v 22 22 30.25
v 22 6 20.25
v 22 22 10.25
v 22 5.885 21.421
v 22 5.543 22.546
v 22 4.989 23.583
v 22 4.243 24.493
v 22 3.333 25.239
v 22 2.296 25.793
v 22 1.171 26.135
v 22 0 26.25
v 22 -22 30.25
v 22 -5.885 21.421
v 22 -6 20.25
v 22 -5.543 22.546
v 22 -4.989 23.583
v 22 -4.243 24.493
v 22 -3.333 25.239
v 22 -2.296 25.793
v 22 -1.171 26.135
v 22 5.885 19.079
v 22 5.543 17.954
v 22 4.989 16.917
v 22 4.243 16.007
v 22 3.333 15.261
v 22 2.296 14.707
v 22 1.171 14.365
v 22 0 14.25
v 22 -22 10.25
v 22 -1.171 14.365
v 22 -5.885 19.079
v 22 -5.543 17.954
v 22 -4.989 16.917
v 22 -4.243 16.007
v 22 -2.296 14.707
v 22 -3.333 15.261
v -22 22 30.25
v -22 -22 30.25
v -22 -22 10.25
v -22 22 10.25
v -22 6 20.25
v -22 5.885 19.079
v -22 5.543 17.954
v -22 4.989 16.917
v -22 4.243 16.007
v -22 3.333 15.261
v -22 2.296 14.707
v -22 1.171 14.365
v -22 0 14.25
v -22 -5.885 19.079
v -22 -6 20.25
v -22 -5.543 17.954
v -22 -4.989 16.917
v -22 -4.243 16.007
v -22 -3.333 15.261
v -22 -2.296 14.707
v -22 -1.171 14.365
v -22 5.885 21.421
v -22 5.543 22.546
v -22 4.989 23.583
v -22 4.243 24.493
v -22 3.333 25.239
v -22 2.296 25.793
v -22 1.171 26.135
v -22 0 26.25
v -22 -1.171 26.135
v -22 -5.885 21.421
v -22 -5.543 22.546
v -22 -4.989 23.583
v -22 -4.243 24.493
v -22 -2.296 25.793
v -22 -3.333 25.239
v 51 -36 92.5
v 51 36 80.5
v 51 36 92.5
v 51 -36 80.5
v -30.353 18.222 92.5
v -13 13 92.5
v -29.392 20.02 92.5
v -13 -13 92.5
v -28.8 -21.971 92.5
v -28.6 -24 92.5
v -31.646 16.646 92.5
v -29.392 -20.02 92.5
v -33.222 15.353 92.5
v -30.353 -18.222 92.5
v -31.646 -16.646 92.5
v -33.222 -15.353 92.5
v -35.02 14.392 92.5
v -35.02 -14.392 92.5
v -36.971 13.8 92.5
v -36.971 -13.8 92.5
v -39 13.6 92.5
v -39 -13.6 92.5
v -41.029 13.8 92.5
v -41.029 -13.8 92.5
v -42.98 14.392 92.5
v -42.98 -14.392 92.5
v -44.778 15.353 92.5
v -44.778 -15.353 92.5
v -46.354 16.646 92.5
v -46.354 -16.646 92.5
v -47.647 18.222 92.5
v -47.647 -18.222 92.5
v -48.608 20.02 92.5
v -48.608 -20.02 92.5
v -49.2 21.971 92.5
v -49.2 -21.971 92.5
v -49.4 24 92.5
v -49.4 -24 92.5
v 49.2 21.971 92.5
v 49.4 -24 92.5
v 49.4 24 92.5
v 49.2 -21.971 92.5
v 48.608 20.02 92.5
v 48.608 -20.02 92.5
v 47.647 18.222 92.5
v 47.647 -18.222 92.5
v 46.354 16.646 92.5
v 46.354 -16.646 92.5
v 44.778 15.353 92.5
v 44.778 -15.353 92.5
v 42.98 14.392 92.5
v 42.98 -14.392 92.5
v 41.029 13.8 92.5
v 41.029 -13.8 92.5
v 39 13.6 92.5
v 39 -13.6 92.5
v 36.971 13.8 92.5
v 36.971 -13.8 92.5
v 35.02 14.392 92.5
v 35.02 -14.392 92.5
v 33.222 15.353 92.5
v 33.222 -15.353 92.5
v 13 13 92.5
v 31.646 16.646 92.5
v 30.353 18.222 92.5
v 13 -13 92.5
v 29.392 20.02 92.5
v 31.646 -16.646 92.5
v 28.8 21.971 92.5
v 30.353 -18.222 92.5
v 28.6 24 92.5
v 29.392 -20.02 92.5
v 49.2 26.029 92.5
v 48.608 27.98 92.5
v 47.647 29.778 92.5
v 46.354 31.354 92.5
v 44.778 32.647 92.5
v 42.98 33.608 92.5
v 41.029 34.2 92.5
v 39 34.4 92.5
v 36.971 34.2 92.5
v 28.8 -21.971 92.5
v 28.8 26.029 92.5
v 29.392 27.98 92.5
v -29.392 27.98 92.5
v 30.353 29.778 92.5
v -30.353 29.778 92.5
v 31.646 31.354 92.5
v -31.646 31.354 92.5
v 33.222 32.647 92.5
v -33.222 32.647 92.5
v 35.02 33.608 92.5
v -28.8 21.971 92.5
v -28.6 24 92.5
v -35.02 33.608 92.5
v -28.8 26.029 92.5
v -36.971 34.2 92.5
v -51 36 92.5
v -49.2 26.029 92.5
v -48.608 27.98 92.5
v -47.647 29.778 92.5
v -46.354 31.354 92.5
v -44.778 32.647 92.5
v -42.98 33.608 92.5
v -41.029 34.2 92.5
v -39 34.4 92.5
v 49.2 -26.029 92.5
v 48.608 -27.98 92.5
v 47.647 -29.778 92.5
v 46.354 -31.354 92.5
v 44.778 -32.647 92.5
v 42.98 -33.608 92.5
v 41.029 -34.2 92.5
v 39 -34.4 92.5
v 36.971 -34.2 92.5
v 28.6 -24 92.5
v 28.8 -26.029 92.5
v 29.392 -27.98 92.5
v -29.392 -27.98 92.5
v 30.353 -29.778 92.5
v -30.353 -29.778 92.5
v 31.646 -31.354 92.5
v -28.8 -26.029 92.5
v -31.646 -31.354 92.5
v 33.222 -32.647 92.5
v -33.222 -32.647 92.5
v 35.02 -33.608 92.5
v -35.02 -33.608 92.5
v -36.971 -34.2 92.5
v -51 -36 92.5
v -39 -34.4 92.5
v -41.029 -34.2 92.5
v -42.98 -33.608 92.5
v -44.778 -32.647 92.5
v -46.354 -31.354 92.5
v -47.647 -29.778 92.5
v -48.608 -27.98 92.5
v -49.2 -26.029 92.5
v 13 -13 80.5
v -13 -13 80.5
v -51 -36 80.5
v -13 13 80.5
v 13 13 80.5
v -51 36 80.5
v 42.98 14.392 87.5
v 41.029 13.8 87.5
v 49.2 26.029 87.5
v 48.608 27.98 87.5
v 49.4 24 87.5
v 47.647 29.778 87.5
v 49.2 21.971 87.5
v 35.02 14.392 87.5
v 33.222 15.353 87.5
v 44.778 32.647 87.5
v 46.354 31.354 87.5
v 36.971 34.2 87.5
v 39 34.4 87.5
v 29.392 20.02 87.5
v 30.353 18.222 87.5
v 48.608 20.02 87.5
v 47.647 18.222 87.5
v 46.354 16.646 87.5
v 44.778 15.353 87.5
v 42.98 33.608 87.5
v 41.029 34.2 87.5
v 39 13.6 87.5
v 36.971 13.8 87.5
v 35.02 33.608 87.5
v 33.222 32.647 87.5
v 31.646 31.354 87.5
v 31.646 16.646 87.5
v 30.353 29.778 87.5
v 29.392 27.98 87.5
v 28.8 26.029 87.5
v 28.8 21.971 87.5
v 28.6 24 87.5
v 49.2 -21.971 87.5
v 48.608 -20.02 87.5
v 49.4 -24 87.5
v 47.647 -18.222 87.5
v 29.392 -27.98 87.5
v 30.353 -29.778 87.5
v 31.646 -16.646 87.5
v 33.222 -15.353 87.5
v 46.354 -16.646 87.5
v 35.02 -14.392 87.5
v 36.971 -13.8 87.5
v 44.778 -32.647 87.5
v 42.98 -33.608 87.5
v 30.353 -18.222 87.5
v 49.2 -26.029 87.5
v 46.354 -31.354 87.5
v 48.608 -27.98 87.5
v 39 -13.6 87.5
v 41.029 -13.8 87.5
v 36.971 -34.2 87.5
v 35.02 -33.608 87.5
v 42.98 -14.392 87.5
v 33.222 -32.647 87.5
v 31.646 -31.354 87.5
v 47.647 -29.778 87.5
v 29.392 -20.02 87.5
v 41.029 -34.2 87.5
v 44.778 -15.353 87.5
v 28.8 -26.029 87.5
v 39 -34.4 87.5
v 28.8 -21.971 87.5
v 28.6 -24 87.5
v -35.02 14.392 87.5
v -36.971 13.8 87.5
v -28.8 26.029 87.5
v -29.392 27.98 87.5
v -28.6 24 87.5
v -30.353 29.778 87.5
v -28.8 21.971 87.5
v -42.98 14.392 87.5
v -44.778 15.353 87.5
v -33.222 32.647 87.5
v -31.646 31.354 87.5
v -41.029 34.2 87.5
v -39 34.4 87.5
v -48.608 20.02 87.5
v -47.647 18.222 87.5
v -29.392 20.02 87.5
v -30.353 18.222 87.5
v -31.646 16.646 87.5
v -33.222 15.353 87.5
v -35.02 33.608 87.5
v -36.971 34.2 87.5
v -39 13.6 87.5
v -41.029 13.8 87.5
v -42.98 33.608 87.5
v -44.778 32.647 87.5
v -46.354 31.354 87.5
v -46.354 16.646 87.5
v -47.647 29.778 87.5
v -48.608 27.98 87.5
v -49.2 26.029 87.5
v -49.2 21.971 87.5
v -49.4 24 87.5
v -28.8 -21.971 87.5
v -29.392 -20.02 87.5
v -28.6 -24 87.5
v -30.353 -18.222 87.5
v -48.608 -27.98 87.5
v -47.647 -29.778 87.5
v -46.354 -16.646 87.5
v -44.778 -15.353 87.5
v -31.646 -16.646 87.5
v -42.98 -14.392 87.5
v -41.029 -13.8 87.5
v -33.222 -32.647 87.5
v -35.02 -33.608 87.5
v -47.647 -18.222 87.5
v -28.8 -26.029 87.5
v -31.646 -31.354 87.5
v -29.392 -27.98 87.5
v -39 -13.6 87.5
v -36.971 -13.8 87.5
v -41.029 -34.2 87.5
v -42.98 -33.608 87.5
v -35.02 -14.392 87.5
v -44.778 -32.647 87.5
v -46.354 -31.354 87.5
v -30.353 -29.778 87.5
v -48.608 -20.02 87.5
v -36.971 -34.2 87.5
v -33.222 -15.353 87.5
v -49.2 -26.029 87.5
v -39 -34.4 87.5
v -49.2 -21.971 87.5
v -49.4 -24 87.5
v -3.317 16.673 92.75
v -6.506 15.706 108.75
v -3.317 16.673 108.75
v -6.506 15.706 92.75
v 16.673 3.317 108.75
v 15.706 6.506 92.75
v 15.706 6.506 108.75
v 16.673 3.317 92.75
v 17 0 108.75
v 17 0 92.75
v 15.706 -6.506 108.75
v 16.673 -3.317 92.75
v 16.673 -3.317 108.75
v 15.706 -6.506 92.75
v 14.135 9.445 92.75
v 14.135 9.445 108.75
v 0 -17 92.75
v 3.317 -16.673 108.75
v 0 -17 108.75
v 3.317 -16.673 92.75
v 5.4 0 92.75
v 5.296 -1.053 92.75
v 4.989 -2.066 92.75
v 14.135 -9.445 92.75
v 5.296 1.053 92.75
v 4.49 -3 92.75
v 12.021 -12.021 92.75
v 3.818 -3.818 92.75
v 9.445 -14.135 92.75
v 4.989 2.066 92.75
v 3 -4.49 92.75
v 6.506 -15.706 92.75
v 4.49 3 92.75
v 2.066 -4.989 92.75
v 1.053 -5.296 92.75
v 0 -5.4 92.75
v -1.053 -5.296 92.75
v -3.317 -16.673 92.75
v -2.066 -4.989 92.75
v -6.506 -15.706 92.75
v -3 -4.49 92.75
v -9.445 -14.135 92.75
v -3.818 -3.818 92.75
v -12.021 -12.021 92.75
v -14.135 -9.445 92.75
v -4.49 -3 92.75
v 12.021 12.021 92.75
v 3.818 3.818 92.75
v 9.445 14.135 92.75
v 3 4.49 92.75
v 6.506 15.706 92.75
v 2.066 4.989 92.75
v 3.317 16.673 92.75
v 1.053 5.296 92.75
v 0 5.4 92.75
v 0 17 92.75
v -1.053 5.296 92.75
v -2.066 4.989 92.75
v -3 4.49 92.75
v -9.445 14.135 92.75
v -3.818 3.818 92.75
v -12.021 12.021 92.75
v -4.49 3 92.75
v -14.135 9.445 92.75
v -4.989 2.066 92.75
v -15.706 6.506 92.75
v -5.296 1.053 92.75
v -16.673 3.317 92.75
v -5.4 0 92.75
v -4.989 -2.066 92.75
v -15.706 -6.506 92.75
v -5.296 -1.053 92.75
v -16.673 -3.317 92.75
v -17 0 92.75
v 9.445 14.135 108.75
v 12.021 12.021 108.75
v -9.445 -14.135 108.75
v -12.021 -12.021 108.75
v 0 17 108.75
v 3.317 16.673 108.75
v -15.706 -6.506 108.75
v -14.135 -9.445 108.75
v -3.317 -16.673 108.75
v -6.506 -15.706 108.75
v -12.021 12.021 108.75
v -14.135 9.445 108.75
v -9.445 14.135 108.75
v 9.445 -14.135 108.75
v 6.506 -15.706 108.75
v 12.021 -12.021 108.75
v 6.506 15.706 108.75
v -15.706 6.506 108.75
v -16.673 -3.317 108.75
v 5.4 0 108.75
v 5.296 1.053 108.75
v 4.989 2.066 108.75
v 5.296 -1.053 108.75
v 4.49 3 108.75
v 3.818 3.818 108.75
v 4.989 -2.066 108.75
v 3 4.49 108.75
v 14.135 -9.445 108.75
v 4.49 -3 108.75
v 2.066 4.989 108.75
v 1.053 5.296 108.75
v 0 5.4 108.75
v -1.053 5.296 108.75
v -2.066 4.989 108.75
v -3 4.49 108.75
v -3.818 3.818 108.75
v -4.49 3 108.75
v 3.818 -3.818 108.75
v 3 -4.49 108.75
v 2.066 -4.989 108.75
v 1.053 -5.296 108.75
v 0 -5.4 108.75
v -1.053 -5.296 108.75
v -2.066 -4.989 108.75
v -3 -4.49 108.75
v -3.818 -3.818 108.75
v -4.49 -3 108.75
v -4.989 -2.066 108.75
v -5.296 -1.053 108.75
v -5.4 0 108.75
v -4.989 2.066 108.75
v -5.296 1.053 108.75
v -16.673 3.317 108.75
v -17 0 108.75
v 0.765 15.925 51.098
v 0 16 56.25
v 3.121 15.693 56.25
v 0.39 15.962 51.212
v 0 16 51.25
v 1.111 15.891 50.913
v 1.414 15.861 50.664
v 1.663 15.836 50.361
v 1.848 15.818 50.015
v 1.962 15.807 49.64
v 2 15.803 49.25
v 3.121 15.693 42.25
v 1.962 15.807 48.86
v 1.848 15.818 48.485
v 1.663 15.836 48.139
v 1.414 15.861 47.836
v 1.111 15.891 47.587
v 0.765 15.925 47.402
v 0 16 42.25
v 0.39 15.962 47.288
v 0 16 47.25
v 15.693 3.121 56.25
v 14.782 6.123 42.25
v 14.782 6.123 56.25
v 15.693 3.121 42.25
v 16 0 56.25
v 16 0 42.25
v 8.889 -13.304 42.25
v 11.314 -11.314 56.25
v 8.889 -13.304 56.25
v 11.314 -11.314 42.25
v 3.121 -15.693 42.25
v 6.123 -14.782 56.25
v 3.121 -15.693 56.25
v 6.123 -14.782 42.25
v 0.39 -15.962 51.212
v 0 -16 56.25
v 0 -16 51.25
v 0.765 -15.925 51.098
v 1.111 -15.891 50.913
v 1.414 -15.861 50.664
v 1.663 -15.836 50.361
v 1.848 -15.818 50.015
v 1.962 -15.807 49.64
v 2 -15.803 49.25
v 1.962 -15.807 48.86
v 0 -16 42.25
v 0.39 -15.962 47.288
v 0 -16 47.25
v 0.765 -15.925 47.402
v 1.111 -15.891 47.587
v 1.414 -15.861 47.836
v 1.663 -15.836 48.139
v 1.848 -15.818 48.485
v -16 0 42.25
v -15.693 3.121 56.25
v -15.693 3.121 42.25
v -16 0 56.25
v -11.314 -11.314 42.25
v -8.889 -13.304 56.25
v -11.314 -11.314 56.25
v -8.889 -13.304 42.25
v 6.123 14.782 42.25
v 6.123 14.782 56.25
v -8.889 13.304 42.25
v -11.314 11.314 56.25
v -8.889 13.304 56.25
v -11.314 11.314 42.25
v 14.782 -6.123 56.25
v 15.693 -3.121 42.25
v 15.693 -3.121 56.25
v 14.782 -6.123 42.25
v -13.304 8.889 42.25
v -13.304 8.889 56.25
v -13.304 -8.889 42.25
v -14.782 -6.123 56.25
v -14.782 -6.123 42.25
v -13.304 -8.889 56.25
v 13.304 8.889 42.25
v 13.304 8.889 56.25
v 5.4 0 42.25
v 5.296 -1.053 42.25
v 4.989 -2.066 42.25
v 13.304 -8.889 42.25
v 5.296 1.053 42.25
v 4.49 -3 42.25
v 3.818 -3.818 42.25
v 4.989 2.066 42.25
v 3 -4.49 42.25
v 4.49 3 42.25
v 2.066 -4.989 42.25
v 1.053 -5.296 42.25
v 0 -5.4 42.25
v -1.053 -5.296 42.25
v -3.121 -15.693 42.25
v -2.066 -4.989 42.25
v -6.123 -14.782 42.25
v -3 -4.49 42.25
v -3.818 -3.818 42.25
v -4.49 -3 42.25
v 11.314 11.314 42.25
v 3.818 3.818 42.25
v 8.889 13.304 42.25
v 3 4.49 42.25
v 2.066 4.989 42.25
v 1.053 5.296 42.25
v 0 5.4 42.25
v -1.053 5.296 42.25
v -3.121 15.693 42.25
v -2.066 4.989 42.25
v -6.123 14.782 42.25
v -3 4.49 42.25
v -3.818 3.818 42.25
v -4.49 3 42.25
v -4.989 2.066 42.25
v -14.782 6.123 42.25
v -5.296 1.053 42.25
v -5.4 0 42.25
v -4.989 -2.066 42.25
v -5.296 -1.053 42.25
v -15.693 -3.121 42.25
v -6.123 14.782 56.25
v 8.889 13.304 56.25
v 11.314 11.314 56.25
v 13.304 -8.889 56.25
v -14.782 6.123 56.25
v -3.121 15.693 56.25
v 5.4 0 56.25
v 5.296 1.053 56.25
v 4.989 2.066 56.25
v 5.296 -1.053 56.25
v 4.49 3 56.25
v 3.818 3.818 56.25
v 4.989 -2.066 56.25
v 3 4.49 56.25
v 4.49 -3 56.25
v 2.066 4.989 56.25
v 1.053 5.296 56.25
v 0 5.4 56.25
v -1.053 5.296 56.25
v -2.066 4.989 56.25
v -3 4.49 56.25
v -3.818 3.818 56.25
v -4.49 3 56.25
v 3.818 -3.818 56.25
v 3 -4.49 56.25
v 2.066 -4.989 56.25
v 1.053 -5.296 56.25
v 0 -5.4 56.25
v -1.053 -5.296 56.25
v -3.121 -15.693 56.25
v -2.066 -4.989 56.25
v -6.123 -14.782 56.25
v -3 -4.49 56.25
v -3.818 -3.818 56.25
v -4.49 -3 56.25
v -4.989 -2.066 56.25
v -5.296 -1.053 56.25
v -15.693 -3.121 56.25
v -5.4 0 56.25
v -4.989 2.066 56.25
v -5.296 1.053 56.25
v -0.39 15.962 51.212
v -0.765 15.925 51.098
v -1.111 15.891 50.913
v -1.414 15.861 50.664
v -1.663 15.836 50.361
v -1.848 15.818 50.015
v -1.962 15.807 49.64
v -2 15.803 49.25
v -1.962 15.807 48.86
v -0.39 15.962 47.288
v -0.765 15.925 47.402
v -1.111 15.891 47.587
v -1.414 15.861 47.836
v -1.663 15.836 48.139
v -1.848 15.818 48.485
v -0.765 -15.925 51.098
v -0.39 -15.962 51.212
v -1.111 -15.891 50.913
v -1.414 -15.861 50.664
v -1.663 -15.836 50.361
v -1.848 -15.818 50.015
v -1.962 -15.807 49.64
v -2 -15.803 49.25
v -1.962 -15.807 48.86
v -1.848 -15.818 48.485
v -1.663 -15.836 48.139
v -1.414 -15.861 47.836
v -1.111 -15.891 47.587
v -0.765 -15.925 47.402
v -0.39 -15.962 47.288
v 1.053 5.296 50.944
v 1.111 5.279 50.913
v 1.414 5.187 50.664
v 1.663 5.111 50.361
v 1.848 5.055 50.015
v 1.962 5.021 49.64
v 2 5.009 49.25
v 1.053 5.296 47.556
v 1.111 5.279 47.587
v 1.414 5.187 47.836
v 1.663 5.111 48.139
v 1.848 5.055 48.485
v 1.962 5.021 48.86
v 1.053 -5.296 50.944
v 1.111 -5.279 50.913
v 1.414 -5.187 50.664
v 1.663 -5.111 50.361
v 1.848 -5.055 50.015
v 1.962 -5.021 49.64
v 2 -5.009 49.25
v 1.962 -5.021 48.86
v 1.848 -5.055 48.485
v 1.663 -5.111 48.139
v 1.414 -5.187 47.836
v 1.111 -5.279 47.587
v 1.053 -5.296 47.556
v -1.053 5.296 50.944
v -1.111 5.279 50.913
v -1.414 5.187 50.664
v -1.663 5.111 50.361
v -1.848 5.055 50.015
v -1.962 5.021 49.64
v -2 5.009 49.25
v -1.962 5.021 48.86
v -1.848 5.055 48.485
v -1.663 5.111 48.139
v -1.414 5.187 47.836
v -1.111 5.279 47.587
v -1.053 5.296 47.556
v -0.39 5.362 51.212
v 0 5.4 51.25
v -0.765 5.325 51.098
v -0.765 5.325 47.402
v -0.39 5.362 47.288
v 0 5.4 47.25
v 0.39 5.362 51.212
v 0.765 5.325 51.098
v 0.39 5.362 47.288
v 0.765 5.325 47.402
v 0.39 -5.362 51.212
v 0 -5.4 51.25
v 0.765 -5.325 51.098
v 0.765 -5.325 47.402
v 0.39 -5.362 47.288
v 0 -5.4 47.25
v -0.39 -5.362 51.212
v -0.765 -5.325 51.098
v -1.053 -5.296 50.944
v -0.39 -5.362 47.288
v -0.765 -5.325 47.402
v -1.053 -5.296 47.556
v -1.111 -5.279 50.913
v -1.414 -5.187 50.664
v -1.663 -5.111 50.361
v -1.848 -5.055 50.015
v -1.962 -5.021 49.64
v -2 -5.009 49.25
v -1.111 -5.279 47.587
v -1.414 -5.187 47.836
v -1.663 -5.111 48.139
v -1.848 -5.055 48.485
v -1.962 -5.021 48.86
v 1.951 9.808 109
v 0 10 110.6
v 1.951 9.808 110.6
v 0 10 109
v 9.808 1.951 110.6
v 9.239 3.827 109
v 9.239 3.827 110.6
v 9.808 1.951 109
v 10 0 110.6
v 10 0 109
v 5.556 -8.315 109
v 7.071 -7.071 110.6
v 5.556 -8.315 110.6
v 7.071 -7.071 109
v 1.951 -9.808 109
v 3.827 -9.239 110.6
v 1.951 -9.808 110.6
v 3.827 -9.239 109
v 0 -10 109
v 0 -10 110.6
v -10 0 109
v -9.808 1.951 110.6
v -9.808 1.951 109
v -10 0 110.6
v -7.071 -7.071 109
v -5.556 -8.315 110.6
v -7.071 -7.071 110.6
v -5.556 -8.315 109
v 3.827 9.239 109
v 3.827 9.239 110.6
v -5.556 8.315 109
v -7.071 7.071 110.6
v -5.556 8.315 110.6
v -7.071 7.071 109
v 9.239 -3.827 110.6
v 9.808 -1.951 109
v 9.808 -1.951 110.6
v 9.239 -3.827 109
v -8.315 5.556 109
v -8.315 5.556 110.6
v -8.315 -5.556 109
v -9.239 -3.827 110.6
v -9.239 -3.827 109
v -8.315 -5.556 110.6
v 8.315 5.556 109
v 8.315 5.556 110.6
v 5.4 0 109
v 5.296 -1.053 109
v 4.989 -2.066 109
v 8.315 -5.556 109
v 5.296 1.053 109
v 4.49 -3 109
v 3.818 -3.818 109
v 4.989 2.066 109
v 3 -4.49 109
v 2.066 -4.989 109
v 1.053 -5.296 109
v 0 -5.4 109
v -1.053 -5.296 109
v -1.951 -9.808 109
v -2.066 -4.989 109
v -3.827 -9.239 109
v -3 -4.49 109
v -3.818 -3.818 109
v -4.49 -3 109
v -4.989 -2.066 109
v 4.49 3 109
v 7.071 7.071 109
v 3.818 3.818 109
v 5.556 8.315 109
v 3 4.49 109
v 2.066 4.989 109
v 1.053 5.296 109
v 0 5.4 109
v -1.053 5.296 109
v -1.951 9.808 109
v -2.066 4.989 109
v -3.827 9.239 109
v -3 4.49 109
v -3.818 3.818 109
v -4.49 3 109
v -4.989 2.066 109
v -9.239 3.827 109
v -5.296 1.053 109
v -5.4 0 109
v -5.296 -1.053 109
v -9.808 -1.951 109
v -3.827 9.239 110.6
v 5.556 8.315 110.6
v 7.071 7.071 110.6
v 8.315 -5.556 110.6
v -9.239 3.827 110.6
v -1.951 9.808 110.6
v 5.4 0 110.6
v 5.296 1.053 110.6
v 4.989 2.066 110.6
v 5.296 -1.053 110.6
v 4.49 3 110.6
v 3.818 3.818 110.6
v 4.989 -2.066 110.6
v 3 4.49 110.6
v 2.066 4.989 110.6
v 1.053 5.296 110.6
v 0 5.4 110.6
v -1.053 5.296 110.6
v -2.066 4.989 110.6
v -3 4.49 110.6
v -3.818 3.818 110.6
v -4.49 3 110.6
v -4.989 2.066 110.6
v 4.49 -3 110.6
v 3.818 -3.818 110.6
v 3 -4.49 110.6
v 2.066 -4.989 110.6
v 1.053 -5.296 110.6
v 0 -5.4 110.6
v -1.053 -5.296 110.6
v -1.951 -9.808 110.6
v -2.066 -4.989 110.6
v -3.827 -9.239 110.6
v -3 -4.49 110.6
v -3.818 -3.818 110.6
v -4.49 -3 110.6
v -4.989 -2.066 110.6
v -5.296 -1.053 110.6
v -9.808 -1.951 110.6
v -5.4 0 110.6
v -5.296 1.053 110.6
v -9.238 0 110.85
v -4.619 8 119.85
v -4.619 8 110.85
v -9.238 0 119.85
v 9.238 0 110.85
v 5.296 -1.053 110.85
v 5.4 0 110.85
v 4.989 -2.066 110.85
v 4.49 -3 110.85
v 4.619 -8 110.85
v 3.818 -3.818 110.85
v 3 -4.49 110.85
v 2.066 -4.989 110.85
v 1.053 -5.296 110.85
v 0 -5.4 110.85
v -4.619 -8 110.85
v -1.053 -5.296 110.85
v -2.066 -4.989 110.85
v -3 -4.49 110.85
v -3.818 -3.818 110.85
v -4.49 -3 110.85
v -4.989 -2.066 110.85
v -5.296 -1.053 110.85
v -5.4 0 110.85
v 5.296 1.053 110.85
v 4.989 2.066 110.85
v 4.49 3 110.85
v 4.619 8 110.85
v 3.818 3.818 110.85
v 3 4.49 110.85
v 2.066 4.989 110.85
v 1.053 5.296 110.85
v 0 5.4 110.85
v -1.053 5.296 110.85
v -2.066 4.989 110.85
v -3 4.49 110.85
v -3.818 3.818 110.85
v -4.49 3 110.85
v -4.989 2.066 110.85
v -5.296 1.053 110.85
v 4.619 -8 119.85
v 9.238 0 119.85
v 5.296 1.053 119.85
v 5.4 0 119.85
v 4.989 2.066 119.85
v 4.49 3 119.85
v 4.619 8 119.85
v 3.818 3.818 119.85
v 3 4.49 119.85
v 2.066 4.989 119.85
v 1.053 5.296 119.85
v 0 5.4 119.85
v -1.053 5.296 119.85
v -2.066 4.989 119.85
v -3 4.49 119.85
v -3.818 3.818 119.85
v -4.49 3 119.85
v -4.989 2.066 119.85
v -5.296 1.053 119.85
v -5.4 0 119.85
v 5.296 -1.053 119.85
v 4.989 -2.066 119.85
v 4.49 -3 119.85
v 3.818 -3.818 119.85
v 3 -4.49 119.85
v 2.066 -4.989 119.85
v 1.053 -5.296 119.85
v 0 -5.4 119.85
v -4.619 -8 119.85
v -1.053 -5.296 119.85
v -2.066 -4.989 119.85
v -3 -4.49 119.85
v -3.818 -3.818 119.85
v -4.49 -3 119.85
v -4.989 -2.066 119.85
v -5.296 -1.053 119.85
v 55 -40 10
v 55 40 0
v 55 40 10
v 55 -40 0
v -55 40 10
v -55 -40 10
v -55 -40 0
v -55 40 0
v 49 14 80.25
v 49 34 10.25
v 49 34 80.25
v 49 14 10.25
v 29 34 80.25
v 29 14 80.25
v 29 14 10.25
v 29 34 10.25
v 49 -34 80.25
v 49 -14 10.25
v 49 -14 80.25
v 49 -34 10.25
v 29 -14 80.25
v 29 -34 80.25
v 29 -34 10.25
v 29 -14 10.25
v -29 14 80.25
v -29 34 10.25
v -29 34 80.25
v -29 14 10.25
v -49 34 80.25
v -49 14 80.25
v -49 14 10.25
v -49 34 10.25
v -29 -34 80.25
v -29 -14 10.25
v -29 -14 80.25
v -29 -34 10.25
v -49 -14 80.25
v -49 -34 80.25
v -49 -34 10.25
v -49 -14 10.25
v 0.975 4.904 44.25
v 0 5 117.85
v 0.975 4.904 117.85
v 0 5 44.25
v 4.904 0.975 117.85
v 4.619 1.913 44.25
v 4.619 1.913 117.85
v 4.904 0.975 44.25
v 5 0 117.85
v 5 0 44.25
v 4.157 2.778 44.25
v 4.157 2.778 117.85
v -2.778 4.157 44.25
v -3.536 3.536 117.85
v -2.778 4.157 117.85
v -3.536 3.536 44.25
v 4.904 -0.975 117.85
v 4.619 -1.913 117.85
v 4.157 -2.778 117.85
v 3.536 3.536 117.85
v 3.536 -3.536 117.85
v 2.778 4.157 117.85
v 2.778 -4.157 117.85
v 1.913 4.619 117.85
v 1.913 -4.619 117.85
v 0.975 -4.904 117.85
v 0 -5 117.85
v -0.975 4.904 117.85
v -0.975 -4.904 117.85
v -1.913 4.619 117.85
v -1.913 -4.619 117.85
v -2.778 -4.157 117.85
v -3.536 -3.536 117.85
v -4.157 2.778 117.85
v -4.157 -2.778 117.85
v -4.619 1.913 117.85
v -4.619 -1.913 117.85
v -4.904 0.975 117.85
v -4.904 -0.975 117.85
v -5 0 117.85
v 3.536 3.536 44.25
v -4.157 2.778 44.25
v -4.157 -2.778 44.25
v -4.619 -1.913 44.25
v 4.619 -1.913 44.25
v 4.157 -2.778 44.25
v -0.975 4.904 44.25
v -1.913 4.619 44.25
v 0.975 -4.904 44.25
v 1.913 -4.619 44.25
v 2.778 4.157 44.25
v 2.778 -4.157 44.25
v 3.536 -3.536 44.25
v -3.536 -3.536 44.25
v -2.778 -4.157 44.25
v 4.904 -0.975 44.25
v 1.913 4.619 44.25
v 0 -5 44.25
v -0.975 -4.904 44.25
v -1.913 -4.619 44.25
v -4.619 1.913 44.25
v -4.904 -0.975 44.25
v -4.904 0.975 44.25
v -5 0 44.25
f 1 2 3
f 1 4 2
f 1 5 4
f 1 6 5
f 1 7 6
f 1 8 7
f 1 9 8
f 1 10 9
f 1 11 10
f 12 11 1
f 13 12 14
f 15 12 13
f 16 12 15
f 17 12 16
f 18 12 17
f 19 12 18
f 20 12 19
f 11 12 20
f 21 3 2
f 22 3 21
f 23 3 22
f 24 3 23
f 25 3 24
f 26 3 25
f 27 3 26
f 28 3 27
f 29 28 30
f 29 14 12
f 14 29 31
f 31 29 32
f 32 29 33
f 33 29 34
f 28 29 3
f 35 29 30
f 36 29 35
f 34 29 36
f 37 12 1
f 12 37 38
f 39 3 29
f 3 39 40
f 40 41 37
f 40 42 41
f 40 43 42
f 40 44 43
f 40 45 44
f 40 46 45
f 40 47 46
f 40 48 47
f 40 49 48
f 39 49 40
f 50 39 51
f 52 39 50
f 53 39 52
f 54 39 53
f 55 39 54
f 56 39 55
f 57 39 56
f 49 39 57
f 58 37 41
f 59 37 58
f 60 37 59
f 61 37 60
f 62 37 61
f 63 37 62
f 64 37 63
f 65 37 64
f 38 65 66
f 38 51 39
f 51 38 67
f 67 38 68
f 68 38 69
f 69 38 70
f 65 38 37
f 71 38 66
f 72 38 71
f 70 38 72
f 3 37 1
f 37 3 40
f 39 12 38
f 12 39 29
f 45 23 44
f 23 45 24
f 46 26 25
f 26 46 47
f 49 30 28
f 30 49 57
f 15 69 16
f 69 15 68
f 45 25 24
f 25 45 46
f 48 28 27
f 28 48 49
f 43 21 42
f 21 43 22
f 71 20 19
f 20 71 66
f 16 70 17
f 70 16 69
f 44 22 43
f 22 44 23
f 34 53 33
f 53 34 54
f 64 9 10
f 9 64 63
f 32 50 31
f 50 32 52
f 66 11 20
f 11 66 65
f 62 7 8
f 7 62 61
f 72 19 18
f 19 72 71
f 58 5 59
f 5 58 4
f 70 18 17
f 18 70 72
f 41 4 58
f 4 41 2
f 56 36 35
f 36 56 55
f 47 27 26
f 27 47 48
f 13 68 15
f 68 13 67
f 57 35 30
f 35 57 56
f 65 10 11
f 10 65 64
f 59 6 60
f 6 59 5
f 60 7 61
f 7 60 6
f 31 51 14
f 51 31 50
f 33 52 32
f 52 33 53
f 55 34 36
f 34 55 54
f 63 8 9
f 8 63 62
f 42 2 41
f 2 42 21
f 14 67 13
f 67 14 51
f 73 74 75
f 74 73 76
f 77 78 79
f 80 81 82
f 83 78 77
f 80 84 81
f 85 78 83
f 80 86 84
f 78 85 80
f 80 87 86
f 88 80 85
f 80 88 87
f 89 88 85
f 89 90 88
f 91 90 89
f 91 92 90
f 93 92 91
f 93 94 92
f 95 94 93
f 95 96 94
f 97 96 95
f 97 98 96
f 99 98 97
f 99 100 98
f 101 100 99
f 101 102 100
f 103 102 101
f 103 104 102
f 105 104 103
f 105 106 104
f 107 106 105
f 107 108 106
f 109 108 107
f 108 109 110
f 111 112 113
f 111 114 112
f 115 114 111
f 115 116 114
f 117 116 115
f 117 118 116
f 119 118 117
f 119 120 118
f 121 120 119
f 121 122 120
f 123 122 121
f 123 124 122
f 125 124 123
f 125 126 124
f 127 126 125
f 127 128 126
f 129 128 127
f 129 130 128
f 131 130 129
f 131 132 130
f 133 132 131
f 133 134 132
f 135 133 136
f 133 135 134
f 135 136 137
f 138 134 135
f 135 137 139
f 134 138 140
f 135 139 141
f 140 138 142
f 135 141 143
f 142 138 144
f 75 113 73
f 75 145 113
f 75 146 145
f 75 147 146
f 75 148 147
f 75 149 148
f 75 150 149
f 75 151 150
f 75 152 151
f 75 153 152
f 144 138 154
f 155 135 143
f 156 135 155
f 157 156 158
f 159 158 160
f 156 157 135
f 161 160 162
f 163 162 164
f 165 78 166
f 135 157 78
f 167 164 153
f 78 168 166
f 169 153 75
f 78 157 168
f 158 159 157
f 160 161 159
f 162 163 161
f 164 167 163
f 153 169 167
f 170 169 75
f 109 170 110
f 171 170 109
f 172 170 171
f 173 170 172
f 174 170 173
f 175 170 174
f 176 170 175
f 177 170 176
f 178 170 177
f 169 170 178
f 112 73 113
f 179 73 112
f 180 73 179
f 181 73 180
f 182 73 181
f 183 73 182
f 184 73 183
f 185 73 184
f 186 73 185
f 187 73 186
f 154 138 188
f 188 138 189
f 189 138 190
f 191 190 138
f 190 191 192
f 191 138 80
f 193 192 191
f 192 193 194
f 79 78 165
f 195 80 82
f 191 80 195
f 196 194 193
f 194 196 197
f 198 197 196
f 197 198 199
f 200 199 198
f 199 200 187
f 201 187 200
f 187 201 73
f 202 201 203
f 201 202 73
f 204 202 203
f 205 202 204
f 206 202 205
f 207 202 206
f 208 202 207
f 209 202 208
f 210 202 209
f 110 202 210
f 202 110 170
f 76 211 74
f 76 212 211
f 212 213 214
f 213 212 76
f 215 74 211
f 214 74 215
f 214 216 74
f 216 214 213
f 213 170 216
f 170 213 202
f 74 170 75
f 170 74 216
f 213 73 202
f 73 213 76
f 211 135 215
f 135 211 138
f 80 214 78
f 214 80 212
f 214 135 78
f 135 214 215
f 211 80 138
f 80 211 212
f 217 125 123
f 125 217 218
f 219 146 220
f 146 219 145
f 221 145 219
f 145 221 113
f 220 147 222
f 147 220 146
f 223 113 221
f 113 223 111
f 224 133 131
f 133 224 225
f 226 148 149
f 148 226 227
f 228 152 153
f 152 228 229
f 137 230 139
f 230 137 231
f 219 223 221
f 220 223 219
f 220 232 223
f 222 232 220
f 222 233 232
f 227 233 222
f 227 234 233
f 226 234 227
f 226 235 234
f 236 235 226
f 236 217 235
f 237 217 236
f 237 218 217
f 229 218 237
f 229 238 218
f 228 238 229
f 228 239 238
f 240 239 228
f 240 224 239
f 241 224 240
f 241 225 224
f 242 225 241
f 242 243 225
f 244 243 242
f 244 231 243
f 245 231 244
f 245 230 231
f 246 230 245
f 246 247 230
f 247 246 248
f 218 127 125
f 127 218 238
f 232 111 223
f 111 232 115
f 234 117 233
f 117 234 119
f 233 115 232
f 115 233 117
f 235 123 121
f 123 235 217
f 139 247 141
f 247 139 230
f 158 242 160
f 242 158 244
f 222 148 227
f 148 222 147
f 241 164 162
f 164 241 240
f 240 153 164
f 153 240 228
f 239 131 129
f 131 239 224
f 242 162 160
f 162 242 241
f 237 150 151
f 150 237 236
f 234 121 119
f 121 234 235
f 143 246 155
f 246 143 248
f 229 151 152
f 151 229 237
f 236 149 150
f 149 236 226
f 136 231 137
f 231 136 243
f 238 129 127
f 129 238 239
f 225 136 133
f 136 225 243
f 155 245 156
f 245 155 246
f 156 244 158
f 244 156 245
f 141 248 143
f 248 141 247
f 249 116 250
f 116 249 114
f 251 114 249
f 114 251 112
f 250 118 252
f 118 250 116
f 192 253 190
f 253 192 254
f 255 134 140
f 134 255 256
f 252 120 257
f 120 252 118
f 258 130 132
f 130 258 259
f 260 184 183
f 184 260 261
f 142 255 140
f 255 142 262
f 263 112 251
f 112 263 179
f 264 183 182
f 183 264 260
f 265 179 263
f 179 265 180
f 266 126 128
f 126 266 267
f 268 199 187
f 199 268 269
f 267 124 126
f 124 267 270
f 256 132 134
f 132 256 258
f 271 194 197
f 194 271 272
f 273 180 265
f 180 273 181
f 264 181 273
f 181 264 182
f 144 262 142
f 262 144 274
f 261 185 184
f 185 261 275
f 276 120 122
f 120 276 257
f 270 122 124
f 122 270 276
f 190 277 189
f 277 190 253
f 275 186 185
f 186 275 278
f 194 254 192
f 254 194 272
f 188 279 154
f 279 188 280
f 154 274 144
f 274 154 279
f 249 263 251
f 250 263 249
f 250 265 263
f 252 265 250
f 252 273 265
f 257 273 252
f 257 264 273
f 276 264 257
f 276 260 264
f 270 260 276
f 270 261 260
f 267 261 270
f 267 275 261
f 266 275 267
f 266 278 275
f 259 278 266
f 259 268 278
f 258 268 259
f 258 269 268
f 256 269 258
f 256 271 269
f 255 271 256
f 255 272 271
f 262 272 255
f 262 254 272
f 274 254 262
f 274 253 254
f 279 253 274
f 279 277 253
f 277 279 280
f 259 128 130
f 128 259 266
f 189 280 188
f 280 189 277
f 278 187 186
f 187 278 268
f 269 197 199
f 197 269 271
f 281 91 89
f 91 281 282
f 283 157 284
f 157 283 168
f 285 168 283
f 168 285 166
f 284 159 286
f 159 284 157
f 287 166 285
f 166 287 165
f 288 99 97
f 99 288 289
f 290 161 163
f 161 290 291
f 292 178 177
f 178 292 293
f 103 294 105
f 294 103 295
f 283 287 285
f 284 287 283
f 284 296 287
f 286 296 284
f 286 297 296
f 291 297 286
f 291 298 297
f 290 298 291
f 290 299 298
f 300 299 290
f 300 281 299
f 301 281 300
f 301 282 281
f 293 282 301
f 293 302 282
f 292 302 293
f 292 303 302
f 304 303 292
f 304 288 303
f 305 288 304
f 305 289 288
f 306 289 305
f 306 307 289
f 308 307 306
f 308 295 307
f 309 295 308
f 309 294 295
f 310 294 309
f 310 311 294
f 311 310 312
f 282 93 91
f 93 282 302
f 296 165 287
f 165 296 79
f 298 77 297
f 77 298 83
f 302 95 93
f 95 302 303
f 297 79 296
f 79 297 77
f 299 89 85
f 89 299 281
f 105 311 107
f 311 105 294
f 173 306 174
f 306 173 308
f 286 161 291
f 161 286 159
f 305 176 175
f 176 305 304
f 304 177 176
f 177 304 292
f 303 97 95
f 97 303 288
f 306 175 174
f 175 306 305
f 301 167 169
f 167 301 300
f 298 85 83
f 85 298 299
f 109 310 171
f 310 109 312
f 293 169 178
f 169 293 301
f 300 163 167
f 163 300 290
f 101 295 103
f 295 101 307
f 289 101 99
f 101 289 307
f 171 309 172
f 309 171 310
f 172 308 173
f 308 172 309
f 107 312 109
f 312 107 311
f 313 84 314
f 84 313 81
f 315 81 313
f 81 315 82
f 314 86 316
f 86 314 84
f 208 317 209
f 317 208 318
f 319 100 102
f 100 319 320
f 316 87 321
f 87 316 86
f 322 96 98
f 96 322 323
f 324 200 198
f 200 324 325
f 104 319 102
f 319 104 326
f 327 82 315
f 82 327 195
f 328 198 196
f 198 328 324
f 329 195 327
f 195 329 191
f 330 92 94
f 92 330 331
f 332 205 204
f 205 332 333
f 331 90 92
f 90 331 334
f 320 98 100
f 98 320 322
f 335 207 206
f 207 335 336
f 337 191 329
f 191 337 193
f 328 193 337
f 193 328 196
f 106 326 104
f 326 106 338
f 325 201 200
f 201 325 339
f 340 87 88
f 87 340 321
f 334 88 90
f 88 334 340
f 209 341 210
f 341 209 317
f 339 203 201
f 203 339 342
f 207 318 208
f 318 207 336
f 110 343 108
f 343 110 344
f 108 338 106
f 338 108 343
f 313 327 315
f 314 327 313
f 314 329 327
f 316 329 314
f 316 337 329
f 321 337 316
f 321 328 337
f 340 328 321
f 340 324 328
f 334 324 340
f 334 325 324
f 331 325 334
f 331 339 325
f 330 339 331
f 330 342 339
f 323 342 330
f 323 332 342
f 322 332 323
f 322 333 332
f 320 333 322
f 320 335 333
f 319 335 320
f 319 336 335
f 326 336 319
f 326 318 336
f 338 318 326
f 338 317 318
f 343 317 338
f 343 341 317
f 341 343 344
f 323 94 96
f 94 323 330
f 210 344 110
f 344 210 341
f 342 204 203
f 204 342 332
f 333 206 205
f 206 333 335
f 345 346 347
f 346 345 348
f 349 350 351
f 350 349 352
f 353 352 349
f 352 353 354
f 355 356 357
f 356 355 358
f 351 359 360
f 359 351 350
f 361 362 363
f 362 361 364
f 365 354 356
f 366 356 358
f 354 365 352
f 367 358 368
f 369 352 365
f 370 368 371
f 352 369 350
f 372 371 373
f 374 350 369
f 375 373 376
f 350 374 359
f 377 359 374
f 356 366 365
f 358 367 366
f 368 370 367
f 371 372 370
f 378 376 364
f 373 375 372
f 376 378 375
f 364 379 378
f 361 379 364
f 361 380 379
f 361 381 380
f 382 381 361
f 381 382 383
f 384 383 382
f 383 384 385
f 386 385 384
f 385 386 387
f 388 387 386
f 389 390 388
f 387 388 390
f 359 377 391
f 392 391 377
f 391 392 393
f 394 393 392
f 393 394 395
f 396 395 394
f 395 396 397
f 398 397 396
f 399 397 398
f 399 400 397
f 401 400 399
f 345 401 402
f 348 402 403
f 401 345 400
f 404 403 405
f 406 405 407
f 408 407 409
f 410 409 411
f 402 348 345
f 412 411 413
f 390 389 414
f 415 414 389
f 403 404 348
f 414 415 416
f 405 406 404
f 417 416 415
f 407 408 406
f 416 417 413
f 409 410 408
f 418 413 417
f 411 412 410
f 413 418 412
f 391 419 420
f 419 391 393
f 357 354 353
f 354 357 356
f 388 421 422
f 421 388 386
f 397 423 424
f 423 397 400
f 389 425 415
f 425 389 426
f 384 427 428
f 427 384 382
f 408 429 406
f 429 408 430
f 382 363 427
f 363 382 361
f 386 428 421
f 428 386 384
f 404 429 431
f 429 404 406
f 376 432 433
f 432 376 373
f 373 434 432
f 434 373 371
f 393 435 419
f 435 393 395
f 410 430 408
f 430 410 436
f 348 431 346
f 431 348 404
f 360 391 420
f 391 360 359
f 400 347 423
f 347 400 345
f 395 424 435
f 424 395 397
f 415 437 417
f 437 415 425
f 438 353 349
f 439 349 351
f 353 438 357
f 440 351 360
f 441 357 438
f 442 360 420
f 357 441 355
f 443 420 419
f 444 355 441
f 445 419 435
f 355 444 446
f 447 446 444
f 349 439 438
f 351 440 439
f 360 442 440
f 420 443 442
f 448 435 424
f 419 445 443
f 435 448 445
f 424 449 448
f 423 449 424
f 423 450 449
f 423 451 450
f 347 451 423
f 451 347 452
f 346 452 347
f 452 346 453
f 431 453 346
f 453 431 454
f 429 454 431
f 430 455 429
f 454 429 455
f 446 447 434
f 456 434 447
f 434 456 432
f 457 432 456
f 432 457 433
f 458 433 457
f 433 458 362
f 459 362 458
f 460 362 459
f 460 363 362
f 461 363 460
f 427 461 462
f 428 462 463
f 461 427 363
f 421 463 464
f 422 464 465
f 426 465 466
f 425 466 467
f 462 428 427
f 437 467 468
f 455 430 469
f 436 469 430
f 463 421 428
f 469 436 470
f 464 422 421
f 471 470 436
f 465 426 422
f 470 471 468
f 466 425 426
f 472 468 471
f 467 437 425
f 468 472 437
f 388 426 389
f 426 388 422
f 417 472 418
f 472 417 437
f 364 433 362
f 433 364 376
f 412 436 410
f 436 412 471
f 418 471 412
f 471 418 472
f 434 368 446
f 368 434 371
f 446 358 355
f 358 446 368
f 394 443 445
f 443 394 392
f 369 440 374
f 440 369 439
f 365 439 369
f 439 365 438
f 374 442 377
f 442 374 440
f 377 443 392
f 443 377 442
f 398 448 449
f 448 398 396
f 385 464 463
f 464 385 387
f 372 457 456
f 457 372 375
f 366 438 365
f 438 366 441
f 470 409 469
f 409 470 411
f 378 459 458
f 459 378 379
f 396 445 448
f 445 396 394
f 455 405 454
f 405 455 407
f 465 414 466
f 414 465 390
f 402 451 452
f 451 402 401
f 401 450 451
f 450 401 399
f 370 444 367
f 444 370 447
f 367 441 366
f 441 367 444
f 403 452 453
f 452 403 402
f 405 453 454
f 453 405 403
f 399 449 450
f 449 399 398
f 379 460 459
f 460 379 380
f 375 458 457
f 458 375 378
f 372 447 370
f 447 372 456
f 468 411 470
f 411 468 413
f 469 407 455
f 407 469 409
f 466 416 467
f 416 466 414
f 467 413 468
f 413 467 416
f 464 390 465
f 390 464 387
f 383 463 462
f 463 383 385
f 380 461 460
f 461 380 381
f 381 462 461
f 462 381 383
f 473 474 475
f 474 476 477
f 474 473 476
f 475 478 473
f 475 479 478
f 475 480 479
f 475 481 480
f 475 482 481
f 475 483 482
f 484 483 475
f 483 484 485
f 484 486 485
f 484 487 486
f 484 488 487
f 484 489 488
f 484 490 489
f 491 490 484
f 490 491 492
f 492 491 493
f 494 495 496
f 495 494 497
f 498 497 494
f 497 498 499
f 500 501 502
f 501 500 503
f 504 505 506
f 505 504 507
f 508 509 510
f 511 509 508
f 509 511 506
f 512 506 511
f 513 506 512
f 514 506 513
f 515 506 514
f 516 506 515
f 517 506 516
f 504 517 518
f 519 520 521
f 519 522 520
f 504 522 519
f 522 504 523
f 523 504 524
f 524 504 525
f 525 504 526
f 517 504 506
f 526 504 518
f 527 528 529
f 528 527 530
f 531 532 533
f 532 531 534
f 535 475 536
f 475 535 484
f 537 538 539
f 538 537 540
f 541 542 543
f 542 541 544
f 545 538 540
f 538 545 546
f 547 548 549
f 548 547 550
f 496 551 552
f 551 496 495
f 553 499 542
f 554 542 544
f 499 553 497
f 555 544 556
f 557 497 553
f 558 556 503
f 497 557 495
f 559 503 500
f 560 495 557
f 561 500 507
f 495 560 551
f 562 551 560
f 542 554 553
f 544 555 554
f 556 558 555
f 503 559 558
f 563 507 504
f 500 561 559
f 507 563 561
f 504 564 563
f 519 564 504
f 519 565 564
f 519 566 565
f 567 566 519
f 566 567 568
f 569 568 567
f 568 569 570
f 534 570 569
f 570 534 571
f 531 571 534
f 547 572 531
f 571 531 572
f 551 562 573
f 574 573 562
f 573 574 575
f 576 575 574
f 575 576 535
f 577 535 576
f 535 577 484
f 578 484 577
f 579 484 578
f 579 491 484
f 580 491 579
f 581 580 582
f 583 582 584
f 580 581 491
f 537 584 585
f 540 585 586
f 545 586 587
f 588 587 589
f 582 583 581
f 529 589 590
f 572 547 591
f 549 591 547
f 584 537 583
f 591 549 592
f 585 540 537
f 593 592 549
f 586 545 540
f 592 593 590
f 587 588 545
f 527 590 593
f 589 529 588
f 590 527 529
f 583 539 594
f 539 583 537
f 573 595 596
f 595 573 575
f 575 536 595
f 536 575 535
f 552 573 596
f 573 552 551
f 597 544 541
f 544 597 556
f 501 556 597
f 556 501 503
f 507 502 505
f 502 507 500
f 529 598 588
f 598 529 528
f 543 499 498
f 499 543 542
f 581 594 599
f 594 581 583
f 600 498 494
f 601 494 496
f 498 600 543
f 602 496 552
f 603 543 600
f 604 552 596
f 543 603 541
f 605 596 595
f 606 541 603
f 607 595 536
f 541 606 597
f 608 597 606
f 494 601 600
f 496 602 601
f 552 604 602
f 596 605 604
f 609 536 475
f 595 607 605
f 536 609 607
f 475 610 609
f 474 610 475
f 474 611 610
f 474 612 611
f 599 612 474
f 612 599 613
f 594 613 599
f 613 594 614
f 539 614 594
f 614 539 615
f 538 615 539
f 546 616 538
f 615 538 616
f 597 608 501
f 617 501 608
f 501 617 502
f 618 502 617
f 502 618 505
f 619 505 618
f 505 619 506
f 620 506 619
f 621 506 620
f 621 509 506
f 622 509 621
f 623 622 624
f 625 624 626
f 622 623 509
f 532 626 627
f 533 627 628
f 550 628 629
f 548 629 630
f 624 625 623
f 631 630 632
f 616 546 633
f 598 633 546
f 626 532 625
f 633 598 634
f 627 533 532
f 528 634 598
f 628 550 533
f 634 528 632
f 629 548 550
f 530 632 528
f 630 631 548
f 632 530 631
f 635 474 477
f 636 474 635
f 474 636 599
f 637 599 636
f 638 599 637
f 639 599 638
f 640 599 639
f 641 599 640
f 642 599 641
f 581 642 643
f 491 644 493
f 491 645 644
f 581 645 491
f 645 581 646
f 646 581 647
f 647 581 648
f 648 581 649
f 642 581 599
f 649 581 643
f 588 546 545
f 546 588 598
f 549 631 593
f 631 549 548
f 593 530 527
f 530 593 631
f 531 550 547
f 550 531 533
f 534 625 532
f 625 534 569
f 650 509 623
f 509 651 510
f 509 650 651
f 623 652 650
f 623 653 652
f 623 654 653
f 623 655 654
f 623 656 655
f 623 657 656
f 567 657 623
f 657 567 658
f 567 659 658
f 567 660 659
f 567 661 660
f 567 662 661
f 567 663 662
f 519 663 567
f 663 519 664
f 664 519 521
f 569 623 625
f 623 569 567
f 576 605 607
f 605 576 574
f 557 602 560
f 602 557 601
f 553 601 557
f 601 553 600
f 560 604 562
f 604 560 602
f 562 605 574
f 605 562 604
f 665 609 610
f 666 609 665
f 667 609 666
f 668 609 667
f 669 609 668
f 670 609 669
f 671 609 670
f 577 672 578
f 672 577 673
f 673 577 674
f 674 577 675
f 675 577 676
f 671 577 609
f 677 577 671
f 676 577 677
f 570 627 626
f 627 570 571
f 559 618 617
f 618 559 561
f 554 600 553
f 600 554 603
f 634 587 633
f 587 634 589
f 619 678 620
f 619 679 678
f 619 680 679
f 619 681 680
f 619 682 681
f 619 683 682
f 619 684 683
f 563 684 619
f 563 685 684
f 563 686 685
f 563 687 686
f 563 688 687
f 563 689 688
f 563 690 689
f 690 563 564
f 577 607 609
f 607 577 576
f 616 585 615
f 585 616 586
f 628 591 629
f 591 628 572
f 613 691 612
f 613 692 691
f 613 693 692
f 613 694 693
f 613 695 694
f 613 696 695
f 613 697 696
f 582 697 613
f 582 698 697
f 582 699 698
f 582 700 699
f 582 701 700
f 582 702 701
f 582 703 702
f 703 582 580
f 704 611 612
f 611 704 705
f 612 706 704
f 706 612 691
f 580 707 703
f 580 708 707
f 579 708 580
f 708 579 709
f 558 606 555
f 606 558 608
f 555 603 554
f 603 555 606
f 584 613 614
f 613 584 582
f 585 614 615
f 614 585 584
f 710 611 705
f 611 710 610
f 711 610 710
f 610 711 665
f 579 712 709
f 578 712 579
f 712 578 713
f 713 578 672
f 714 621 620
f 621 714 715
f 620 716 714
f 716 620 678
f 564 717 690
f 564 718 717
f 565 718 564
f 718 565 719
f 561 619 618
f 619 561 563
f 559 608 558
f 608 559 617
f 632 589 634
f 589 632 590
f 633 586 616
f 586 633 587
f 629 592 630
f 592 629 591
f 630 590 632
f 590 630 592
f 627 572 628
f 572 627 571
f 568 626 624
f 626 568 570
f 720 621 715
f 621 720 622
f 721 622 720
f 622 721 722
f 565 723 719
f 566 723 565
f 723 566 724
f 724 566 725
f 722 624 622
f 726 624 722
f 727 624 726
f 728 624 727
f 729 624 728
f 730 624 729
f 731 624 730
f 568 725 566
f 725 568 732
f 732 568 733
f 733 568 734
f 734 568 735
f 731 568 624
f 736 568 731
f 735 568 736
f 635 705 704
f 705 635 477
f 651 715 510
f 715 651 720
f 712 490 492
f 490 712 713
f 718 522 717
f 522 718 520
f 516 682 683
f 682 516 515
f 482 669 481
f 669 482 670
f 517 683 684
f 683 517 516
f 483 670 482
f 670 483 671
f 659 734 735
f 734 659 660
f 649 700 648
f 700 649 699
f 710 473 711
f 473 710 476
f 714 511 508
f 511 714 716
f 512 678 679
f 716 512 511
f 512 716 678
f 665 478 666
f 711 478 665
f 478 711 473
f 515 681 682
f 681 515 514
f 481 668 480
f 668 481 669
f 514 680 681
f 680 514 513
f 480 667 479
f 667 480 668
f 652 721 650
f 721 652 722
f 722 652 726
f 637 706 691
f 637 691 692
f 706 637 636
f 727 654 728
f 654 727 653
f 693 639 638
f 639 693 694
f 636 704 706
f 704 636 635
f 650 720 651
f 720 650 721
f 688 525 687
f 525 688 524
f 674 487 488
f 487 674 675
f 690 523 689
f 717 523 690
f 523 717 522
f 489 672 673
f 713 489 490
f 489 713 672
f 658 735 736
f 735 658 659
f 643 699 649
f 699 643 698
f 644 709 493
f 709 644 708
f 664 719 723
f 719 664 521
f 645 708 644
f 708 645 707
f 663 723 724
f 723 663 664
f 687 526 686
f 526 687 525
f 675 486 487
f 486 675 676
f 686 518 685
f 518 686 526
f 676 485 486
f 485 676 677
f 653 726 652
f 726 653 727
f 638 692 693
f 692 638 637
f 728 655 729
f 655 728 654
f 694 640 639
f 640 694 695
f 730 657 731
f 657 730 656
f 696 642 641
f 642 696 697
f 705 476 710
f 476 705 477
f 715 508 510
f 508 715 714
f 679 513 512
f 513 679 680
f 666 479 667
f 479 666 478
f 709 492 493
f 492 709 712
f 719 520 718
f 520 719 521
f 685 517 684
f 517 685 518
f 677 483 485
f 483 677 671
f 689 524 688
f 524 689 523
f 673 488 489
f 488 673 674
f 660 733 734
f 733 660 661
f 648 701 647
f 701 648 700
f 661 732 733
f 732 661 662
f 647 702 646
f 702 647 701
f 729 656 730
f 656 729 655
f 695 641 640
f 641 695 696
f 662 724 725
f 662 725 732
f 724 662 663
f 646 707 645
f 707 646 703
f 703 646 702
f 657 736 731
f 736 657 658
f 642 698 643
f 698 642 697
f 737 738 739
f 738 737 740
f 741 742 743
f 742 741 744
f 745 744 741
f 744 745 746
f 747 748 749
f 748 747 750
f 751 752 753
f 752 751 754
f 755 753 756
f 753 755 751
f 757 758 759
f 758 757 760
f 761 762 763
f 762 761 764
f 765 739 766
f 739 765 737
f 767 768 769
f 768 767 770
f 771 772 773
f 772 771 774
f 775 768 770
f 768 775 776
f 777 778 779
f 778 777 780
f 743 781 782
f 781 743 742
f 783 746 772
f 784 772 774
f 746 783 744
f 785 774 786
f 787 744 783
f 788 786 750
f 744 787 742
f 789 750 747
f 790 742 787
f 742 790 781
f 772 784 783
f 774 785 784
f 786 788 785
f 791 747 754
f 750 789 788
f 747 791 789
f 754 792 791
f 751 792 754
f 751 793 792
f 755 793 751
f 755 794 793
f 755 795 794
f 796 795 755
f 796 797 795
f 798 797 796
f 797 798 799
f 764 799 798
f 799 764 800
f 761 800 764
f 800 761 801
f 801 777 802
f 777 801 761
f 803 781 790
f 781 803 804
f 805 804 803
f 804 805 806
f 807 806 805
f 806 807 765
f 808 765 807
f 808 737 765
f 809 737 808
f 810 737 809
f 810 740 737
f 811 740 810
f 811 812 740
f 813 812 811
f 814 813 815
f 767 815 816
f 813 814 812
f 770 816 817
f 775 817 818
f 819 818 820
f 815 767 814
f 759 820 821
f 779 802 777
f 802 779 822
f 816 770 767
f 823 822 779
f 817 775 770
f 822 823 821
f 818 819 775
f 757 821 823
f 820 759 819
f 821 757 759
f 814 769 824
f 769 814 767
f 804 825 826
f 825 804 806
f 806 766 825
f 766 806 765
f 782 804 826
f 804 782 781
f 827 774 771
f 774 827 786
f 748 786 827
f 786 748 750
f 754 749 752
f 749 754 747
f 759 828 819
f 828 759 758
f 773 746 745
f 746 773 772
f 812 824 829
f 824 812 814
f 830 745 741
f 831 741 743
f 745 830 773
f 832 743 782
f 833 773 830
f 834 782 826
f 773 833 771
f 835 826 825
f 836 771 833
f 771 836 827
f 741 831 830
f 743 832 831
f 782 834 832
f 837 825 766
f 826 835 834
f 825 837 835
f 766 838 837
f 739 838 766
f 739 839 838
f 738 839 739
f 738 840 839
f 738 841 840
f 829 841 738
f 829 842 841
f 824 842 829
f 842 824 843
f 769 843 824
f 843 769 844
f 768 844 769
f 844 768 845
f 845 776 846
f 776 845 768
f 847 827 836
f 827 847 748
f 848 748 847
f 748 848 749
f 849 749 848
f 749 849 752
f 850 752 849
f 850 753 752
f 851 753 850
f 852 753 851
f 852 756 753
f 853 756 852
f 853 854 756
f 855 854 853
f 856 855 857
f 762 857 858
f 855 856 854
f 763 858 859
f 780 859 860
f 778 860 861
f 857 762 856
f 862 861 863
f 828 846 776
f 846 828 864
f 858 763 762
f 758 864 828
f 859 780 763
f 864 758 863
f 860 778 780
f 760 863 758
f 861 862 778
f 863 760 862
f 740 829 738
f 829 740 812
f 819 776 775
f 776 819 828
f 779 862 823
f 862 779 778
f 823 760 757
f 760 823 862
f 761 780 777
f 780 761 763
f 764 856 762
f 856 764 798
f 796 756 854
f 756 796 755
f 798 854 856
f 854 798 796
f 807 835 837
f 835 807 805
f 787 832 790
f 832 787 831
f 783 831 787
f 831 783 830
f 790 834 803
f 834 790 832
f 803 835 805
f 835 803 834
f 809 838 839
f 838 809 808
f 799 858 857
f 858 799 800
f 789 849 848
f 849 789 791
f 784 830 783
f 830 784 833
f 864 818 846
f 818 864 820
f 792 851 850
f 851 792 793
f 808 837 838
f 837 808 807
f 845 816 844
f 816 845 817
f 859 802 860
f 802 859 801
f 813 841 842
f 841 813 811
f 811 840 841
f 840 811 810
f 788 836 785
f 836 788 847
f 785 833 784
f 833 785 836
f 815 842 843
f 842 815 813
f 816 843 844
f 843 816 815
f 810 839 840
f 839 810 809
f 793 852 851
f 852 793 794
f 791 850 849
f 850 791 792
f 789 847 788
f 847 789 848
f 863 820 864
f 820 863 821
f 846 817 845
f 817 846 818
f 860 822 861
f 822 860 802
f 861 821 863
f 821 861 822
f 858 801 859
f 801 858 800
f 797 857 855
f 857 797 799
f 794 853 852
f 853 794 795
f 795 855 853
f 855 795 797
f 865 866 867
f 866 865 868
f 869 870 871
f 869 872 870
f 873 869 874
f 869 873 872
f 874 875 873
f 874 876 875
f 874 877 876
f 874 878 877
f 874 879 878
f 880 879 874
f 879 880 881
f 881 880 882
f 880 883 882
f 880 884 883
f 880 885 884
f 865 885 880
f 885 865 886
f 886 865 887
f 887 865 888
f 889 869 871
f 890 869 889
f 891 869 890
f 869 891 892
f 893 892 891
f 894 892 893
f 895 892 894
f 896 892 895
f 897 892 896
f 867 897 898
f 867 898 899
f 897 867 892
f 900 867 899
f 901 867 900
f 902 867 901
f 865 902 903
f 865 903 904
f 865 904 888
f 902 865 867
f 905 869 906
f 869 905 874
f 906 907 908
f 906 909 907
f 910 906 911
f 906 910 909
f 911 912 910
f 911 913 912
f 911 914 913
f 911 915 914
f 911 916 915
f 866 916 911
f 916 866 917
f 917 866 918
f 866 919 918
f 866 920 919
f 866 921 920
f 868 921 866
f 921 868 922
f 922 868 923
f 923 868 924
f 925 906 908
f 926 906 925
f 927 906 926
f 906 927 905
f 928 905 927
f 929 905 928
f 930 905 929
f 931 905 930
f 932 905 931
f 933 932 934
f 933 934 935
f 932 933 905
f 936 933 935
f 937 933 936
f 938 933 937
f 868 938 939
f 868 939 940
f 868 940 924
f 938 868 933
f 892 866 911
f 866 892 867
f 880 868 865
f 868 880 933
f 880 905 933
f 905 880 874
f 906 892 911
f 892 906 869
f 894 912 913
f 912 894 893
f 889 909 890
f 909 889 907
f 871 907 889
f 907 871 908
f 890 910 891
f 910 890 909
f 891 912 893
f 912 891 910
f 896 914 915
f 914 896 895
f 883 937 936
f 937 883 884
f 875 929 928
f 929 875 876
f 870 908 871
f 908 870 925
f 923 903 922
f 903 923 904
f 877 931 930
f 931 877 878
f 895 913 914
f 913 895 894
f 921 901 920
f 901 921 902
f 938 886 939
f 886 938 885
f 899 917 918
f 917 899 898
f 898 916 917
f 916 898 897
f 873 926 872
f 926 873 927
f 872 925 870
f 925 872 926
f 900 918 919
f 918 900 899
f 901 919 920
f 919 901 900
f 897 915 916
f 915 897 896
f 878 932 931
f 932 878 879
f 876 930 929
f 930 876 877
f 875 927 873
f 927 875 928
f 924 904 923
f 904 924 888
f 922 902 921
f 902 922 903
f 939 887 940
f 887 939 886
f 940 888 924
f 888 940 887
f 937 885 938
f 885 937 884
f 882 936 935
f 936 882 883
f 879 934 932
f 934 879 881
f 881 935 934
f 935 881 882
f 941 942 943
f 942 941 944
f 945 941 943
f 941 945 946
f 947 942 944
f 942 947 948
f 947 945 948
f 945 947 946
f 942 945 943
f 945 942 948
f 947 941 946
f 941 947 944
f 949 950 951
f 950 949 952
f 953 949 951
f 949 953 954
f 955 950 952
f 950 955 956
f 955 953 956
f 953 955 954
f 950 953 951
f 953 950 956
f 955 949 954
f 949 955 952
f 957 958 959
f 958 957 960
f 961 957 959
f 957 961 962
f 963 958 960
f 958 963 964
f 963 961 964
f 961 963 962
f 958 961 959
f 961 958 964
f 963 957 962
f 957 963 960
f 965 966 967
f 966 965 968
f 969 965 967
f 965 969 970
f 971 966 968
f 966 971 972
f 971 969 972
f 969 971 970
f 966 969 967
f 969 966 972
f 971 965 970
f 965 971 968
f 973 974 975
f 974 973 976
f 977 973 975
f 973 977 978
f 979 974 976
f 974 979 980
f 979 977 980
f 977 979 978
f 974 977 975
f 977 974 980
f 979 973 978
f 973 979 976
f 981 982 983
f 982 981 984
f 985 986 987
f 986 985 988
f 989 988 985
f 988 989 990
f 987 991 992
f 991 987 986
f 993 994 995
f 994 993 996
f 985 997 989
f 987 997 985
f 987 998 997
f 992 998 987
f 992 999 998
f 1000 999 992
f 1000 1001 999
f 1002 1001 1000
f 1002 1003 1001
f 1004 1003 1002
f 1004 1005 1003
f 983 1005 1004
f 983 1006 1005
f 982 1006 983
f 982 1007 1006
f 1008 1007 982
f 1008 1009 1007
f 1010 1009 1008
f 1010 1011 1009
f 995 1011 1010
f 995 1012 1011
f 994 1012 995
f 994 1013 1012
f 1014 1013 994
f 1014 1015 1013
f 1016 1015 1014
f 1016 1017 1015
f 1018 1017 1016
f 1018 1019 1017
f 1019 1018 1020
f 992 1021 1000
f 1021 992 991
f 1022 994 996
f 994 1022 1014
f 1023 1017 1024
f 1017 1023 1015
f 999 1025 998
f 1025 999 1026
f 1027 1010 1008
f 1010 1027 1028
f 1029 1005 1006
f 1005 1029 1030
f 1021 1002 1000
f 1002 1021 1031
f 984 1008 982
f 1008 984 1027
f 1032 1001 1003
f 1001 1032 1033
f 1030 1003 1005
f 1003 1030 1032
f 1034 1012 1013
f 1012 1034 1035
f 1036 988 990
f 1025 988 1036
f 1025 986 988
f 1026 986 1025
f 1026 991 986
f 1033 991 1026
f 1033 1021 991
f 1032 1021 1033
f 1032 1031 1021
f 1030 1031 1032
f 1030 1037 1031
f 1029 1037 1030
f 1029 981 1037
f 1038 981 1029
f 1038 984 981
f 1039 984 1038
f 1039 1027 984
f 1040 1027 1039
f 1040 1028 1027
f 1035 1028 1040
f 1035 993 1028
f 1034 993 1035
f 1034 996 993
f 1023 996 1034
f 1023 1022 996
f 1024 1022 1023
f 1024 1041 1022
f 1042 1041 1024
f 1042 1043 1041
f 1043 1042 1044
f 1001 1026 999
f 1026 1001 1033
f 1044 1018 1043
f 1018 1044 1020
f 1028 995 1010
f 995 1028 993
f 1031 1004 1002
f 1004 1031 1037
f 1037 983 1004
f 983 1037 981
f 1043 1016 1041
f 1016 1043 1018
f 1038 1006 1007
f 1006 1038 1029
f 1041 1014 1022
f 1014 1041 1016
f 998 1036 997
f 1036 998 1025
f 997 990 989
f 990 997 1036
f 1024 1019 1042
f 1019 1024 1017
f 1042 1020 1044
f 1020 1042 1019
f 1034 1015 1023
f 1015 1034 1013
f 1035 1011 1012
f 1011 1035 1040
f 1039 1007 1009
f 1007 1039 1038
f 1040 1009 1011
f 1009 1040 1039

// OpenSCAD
$fn = 32;

// ------------------------------------------------------------------------
// Arbor press fixture: screw d10, posts 70 mm, gap 12 mm
// Every part is its own module, assembly() places every instance.
// ------------------------------------------------------------------------

// --- part 1 ---
module press_bed() {
  difference() {
    translate([-55, -40, 0]) cube([110, 80, 10]);
  }
}

// --- part 2 ---
module anvil_block() {
  difference() {
    translate([-22, -22, 0]) cube([44, 44, 20]);
    translate([0, 0, 10]) rotate([0, 90, 0]) cylinder(h = 46, d = 12, center = true);
  }
}

// --- part 3 ---
module press_post_a() {
  translate([-10, -10, 0]) cube([20, 20, 70]);
}

// --- part 4 ---
module press_post_b() {
  translate([-10, -10, 0]) cube([20, 20, 70]);
}

// --- part 5 ---
module press_post_c() {
  translate([-10, -10, 0]) cube([20, 20, 70]);
}

// --- part 6 ---
module press_post_d() {
  translate([-10, -10, 0]) cube([20, 20, 70]);
}

// --- part 7 ---
module press_frame() {
  difference() {
    translate([-51, -36, 0]) cube([102, 72, 12]);
    translate([-13, -13, -1]) cube([26, 26, 14]);
    translate([39, 24, 7]) cylinder(h = 6, d = 20.8);
    translate([39, -24, 7]) cylinder(h = 6, d = 20.8);
    translate([-39, 24, 7]) cylinder(h = 6, d = 20.8);
    translate([-39, -24, 7]) cylinder(h = 6, d = 20.8);
  }
}

// --- part 8 ---
module guide_ring() {
  difference() {
      translate([0, 0, 0]) cylinder(h = 16, d = 34);
      translate([0, 0, -1]) cylinder(h = 18, d = 10.8);
    }
}

// --- part 9 ---
module press_screw() {
  translate([0, 0, -36.8]) cylinder(h = 73.6, d = 10);
}

// --- part 10 ---
module press_head() {
  difference() {
    cylinder(h = 14, d = 32);
    translate([0, 0, -1]) cylinder(h = 16, d = 10.8);
    translate([0, 0, 7]) rotate([90, 0, 0]) cylinder(h = 34, d = 4, center = true);
  }
}

// --- part 11 ---
module nut_washer() {
  difference() {
      translate([0, 0, 0]) cylinder(h = 1.6, d = 20);
      translate([0, 0, -1]) cylinder(h = 3.6, d = 10.8);
    }
}

// --- part 12 ---
module press_nut() {
  difference() {
    linear_extrude(height = 9) polygon(points = [[9.238, 0], [4.619, 8], [-4.619, 8], [-9.238, 0], [-4.619, -8], [4.619, -8]]);
    translate([0, 0, -1]) cylinder(h = 11, d = 10.8);
  }
}

// --- assembly ---
module assembly() {
  color([0.80, 0.24, 0.20]) translate([0, 0, 0]) rotate([0, 0, 0]) press_bed();
  color([0.20, 0.45, 0.75]) translate([0, 0, 10.25]) rotate([0, 0, 0]) anvil_block();
  color([0.25, 0.62, 0.32]) translate([39, 24, 10.25]) rotate([0, 0, 0]) press_post_a();
  color([0.92, 0.70, 0.18]) translate([39, -24, 10.25]) rotate([0, 0, 0]) press_post_b();
  color([0.58, 0.35, 0.70]) translate([-39, 24, 10.25]) rotate([0, 0, 0]) press_post_c();
  color([0.16, 0.66, 0.66]) translate([-39, -24, 10.25]) rotate([0, 0, 0]) press_post_d();
  color([0.85, 0.48, 0.18]) translate([0, 0, 80.5]) rotate([0, 0, 0]) press_frame();
  color([0.55, 0.60, 0.65]) translate([0, 0, 92.75]) rotate([0, 0, 0]) guide_ring();
  color([0.75, 0.30, 0.55]) translate([0, 0, 81.05]) rotate([0, 0, 0]) press_screw();
  color([0.42, 0.52, 0.28]) translate([0, 0, 42.25]) rotate([0, 0, 0]) press_head();
  color([0.80, 0.24, 0.20]) translate([0, 0, 109]) rotate([0, 0, 0]) nut_washer();
  color([0.20, 0.45, 0.75]) translate([0, 0, 110.85]) rotate([0, 0, 0]) press_nut();
}

assembly();
